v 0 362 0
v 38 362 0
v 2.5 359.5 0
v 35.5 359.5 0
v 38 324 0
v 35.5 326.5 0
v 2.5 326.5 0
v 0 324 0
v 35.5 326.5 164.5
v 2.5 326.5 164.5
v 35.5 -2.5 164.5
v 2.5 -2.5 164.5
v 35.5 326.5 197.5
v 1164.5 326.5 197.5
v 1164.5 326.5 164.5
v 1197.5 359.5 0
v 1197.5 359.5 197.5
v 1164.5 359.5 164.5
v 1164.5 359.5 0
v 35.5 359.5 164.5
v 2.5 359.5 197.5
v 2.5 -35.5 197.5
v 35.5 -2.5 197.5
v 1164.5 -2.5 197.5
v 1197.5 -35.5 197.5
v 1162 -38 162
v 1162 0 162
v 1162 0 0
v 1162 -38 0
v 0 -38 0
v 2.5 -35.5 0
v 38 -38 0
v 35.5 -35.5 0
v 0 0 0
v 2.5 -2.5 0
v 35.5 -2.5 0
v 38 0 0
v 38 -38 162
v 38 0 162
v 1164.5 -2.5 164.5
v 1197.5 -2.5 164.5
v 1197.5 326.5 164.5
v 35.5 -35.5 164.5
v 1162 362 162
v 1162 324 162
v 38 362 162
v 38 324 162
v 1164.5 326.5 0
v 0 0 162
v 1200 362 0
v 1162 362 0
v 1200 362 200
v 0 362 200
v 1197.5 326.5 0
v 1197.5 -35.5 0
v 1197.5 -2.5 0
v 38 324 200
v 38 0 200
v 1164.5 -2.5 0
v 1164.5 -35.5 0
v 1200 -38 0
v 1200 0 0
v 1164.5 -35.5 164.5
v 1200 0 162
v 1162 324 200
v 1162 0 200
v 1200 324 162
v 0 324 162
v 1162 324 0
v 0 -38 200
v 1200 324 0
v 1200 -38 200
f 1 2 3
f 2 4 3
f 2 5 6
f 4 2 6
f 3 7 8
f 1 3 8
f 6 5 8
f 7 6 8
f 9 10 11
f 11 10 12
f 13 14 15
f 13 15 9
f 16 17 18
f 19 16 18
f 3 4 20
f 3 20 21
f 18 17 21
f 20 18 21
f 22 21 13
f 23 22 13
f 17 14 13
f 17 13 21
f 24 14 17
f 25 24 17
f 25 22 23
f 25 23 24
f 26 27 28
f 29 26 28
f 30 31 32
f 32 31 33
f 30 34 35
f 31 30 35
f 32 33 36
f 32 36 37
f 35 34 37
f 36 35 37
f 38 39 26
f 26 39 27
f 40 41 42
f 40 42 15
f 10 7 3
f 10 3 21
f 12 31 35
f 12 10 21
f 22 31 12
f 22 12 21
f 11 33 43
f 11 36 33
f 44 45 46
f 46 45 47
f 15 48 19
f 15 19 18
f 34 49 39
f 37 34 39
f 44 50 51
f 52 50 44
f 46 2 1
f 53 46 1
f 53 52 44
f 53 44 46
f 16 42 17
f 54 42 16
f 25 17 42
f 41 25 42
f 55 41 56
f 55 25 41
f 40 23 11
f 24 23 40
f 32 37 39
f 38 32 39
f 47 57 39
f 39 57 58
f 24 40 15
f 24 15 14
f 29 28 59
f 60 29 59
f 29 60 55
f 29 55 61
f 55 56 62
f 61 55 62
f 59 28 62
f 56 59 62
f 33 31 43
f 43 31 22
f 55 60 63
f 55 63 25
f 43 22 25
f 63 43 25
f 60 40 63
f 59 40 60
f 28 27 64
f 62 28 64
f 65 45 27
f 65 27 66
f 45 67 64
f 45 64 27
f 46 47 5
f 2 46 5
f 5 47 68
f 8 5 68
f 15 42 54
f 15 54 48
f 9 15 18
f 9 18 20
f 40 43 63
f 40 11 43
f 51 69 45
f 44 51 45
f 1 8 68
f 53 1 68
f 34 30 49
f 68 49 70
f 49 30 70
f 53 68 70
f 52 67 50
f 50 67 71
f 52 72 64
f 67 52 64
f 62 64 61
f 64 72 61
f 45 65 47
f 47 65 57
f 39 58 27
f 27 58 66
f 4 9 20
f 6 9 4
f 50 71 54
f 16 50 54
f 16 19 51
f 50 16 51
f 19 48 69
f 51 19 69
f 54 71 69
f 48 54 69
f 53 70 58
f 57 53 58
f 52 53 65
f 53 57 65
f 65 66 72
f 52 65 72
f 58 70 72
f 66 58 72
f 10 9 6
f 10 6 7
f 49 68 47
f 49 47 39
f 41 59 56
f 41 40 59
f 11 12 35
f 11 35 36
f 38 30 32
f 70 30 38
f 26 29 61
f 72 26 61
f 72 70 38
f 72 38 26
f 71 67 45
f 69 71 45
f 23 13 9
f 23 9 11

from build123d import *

# Parameters (mm, degrees)
F1_DEPTH = 38
F2_W     = 324
F2_H     = 38
F3_DEPTH = 38
F4_W     = 38
F4_H     = 38
F5_DEPTH = 324
F7_DEPTH = 38
F8_T     = -2.5


with BuildPart() as f1:
    # F0 (on Front) → F1 (new body)
    with BuildSketch(Plane.XZ):
        Polygon((0, 200), (0, 0), (38, 0), (38, 162), (1162, 162), (1162, 0), (1200, 0), (1200, 200), (1162, 200), (38, 200), align=None)
    extrude(amount=F1_DEPTH)

    # F2 (on face) → F3 (join)
    with BuildSketch(Plane(origin=(0, 0, 0), x_dir=(0, -1, 0), z_dir=(-1, 0, 0))):
        with Locations((-162, 181)):
            Rectangle(F2_W, F2_H)
    extrude(amount=-F3_DEPTH)

    # F4 (on face) → F5 (join)
    with BuildSketch(Plane(origin=(0, 0, 0), x_dir=(-1, 0, 0), z_dir=(0, 1, 0))):
        with Locations((-1181, 181)):
            Rectangle(F4_W, F4_H)
    extrude(amount=F5_DEPTH)

    # F6 (on face) → F7 (join)
    with BuildSketch(Plane(origin=(0, 324, 0), x_dir=(-1, 0, 0), z_dir=(0, 1, 0))):
        Polygon((-1162, 200), (-1200, 200), (-1200, 162), (-1200, 0), (-1162, 0), (-1162, 162), (-38, 162), (-38, 0), (0, 0), (0, 162), (0, 200), (-38, 200), align=None)
    extrude(amount=F7_DEPTH)

    # F8
    f8_openings = [f1.faces().sort_by_distance(p)[0] for p in [
        (19, 343, 0),
        (19, -19, 0),
        (1181, -19, 0),
        (1181, 343, 0),
    ]]
    offset(amount=F8_T, openings=f8_openings, kind=Kind.INTERSECTION)


solid = f1.part
